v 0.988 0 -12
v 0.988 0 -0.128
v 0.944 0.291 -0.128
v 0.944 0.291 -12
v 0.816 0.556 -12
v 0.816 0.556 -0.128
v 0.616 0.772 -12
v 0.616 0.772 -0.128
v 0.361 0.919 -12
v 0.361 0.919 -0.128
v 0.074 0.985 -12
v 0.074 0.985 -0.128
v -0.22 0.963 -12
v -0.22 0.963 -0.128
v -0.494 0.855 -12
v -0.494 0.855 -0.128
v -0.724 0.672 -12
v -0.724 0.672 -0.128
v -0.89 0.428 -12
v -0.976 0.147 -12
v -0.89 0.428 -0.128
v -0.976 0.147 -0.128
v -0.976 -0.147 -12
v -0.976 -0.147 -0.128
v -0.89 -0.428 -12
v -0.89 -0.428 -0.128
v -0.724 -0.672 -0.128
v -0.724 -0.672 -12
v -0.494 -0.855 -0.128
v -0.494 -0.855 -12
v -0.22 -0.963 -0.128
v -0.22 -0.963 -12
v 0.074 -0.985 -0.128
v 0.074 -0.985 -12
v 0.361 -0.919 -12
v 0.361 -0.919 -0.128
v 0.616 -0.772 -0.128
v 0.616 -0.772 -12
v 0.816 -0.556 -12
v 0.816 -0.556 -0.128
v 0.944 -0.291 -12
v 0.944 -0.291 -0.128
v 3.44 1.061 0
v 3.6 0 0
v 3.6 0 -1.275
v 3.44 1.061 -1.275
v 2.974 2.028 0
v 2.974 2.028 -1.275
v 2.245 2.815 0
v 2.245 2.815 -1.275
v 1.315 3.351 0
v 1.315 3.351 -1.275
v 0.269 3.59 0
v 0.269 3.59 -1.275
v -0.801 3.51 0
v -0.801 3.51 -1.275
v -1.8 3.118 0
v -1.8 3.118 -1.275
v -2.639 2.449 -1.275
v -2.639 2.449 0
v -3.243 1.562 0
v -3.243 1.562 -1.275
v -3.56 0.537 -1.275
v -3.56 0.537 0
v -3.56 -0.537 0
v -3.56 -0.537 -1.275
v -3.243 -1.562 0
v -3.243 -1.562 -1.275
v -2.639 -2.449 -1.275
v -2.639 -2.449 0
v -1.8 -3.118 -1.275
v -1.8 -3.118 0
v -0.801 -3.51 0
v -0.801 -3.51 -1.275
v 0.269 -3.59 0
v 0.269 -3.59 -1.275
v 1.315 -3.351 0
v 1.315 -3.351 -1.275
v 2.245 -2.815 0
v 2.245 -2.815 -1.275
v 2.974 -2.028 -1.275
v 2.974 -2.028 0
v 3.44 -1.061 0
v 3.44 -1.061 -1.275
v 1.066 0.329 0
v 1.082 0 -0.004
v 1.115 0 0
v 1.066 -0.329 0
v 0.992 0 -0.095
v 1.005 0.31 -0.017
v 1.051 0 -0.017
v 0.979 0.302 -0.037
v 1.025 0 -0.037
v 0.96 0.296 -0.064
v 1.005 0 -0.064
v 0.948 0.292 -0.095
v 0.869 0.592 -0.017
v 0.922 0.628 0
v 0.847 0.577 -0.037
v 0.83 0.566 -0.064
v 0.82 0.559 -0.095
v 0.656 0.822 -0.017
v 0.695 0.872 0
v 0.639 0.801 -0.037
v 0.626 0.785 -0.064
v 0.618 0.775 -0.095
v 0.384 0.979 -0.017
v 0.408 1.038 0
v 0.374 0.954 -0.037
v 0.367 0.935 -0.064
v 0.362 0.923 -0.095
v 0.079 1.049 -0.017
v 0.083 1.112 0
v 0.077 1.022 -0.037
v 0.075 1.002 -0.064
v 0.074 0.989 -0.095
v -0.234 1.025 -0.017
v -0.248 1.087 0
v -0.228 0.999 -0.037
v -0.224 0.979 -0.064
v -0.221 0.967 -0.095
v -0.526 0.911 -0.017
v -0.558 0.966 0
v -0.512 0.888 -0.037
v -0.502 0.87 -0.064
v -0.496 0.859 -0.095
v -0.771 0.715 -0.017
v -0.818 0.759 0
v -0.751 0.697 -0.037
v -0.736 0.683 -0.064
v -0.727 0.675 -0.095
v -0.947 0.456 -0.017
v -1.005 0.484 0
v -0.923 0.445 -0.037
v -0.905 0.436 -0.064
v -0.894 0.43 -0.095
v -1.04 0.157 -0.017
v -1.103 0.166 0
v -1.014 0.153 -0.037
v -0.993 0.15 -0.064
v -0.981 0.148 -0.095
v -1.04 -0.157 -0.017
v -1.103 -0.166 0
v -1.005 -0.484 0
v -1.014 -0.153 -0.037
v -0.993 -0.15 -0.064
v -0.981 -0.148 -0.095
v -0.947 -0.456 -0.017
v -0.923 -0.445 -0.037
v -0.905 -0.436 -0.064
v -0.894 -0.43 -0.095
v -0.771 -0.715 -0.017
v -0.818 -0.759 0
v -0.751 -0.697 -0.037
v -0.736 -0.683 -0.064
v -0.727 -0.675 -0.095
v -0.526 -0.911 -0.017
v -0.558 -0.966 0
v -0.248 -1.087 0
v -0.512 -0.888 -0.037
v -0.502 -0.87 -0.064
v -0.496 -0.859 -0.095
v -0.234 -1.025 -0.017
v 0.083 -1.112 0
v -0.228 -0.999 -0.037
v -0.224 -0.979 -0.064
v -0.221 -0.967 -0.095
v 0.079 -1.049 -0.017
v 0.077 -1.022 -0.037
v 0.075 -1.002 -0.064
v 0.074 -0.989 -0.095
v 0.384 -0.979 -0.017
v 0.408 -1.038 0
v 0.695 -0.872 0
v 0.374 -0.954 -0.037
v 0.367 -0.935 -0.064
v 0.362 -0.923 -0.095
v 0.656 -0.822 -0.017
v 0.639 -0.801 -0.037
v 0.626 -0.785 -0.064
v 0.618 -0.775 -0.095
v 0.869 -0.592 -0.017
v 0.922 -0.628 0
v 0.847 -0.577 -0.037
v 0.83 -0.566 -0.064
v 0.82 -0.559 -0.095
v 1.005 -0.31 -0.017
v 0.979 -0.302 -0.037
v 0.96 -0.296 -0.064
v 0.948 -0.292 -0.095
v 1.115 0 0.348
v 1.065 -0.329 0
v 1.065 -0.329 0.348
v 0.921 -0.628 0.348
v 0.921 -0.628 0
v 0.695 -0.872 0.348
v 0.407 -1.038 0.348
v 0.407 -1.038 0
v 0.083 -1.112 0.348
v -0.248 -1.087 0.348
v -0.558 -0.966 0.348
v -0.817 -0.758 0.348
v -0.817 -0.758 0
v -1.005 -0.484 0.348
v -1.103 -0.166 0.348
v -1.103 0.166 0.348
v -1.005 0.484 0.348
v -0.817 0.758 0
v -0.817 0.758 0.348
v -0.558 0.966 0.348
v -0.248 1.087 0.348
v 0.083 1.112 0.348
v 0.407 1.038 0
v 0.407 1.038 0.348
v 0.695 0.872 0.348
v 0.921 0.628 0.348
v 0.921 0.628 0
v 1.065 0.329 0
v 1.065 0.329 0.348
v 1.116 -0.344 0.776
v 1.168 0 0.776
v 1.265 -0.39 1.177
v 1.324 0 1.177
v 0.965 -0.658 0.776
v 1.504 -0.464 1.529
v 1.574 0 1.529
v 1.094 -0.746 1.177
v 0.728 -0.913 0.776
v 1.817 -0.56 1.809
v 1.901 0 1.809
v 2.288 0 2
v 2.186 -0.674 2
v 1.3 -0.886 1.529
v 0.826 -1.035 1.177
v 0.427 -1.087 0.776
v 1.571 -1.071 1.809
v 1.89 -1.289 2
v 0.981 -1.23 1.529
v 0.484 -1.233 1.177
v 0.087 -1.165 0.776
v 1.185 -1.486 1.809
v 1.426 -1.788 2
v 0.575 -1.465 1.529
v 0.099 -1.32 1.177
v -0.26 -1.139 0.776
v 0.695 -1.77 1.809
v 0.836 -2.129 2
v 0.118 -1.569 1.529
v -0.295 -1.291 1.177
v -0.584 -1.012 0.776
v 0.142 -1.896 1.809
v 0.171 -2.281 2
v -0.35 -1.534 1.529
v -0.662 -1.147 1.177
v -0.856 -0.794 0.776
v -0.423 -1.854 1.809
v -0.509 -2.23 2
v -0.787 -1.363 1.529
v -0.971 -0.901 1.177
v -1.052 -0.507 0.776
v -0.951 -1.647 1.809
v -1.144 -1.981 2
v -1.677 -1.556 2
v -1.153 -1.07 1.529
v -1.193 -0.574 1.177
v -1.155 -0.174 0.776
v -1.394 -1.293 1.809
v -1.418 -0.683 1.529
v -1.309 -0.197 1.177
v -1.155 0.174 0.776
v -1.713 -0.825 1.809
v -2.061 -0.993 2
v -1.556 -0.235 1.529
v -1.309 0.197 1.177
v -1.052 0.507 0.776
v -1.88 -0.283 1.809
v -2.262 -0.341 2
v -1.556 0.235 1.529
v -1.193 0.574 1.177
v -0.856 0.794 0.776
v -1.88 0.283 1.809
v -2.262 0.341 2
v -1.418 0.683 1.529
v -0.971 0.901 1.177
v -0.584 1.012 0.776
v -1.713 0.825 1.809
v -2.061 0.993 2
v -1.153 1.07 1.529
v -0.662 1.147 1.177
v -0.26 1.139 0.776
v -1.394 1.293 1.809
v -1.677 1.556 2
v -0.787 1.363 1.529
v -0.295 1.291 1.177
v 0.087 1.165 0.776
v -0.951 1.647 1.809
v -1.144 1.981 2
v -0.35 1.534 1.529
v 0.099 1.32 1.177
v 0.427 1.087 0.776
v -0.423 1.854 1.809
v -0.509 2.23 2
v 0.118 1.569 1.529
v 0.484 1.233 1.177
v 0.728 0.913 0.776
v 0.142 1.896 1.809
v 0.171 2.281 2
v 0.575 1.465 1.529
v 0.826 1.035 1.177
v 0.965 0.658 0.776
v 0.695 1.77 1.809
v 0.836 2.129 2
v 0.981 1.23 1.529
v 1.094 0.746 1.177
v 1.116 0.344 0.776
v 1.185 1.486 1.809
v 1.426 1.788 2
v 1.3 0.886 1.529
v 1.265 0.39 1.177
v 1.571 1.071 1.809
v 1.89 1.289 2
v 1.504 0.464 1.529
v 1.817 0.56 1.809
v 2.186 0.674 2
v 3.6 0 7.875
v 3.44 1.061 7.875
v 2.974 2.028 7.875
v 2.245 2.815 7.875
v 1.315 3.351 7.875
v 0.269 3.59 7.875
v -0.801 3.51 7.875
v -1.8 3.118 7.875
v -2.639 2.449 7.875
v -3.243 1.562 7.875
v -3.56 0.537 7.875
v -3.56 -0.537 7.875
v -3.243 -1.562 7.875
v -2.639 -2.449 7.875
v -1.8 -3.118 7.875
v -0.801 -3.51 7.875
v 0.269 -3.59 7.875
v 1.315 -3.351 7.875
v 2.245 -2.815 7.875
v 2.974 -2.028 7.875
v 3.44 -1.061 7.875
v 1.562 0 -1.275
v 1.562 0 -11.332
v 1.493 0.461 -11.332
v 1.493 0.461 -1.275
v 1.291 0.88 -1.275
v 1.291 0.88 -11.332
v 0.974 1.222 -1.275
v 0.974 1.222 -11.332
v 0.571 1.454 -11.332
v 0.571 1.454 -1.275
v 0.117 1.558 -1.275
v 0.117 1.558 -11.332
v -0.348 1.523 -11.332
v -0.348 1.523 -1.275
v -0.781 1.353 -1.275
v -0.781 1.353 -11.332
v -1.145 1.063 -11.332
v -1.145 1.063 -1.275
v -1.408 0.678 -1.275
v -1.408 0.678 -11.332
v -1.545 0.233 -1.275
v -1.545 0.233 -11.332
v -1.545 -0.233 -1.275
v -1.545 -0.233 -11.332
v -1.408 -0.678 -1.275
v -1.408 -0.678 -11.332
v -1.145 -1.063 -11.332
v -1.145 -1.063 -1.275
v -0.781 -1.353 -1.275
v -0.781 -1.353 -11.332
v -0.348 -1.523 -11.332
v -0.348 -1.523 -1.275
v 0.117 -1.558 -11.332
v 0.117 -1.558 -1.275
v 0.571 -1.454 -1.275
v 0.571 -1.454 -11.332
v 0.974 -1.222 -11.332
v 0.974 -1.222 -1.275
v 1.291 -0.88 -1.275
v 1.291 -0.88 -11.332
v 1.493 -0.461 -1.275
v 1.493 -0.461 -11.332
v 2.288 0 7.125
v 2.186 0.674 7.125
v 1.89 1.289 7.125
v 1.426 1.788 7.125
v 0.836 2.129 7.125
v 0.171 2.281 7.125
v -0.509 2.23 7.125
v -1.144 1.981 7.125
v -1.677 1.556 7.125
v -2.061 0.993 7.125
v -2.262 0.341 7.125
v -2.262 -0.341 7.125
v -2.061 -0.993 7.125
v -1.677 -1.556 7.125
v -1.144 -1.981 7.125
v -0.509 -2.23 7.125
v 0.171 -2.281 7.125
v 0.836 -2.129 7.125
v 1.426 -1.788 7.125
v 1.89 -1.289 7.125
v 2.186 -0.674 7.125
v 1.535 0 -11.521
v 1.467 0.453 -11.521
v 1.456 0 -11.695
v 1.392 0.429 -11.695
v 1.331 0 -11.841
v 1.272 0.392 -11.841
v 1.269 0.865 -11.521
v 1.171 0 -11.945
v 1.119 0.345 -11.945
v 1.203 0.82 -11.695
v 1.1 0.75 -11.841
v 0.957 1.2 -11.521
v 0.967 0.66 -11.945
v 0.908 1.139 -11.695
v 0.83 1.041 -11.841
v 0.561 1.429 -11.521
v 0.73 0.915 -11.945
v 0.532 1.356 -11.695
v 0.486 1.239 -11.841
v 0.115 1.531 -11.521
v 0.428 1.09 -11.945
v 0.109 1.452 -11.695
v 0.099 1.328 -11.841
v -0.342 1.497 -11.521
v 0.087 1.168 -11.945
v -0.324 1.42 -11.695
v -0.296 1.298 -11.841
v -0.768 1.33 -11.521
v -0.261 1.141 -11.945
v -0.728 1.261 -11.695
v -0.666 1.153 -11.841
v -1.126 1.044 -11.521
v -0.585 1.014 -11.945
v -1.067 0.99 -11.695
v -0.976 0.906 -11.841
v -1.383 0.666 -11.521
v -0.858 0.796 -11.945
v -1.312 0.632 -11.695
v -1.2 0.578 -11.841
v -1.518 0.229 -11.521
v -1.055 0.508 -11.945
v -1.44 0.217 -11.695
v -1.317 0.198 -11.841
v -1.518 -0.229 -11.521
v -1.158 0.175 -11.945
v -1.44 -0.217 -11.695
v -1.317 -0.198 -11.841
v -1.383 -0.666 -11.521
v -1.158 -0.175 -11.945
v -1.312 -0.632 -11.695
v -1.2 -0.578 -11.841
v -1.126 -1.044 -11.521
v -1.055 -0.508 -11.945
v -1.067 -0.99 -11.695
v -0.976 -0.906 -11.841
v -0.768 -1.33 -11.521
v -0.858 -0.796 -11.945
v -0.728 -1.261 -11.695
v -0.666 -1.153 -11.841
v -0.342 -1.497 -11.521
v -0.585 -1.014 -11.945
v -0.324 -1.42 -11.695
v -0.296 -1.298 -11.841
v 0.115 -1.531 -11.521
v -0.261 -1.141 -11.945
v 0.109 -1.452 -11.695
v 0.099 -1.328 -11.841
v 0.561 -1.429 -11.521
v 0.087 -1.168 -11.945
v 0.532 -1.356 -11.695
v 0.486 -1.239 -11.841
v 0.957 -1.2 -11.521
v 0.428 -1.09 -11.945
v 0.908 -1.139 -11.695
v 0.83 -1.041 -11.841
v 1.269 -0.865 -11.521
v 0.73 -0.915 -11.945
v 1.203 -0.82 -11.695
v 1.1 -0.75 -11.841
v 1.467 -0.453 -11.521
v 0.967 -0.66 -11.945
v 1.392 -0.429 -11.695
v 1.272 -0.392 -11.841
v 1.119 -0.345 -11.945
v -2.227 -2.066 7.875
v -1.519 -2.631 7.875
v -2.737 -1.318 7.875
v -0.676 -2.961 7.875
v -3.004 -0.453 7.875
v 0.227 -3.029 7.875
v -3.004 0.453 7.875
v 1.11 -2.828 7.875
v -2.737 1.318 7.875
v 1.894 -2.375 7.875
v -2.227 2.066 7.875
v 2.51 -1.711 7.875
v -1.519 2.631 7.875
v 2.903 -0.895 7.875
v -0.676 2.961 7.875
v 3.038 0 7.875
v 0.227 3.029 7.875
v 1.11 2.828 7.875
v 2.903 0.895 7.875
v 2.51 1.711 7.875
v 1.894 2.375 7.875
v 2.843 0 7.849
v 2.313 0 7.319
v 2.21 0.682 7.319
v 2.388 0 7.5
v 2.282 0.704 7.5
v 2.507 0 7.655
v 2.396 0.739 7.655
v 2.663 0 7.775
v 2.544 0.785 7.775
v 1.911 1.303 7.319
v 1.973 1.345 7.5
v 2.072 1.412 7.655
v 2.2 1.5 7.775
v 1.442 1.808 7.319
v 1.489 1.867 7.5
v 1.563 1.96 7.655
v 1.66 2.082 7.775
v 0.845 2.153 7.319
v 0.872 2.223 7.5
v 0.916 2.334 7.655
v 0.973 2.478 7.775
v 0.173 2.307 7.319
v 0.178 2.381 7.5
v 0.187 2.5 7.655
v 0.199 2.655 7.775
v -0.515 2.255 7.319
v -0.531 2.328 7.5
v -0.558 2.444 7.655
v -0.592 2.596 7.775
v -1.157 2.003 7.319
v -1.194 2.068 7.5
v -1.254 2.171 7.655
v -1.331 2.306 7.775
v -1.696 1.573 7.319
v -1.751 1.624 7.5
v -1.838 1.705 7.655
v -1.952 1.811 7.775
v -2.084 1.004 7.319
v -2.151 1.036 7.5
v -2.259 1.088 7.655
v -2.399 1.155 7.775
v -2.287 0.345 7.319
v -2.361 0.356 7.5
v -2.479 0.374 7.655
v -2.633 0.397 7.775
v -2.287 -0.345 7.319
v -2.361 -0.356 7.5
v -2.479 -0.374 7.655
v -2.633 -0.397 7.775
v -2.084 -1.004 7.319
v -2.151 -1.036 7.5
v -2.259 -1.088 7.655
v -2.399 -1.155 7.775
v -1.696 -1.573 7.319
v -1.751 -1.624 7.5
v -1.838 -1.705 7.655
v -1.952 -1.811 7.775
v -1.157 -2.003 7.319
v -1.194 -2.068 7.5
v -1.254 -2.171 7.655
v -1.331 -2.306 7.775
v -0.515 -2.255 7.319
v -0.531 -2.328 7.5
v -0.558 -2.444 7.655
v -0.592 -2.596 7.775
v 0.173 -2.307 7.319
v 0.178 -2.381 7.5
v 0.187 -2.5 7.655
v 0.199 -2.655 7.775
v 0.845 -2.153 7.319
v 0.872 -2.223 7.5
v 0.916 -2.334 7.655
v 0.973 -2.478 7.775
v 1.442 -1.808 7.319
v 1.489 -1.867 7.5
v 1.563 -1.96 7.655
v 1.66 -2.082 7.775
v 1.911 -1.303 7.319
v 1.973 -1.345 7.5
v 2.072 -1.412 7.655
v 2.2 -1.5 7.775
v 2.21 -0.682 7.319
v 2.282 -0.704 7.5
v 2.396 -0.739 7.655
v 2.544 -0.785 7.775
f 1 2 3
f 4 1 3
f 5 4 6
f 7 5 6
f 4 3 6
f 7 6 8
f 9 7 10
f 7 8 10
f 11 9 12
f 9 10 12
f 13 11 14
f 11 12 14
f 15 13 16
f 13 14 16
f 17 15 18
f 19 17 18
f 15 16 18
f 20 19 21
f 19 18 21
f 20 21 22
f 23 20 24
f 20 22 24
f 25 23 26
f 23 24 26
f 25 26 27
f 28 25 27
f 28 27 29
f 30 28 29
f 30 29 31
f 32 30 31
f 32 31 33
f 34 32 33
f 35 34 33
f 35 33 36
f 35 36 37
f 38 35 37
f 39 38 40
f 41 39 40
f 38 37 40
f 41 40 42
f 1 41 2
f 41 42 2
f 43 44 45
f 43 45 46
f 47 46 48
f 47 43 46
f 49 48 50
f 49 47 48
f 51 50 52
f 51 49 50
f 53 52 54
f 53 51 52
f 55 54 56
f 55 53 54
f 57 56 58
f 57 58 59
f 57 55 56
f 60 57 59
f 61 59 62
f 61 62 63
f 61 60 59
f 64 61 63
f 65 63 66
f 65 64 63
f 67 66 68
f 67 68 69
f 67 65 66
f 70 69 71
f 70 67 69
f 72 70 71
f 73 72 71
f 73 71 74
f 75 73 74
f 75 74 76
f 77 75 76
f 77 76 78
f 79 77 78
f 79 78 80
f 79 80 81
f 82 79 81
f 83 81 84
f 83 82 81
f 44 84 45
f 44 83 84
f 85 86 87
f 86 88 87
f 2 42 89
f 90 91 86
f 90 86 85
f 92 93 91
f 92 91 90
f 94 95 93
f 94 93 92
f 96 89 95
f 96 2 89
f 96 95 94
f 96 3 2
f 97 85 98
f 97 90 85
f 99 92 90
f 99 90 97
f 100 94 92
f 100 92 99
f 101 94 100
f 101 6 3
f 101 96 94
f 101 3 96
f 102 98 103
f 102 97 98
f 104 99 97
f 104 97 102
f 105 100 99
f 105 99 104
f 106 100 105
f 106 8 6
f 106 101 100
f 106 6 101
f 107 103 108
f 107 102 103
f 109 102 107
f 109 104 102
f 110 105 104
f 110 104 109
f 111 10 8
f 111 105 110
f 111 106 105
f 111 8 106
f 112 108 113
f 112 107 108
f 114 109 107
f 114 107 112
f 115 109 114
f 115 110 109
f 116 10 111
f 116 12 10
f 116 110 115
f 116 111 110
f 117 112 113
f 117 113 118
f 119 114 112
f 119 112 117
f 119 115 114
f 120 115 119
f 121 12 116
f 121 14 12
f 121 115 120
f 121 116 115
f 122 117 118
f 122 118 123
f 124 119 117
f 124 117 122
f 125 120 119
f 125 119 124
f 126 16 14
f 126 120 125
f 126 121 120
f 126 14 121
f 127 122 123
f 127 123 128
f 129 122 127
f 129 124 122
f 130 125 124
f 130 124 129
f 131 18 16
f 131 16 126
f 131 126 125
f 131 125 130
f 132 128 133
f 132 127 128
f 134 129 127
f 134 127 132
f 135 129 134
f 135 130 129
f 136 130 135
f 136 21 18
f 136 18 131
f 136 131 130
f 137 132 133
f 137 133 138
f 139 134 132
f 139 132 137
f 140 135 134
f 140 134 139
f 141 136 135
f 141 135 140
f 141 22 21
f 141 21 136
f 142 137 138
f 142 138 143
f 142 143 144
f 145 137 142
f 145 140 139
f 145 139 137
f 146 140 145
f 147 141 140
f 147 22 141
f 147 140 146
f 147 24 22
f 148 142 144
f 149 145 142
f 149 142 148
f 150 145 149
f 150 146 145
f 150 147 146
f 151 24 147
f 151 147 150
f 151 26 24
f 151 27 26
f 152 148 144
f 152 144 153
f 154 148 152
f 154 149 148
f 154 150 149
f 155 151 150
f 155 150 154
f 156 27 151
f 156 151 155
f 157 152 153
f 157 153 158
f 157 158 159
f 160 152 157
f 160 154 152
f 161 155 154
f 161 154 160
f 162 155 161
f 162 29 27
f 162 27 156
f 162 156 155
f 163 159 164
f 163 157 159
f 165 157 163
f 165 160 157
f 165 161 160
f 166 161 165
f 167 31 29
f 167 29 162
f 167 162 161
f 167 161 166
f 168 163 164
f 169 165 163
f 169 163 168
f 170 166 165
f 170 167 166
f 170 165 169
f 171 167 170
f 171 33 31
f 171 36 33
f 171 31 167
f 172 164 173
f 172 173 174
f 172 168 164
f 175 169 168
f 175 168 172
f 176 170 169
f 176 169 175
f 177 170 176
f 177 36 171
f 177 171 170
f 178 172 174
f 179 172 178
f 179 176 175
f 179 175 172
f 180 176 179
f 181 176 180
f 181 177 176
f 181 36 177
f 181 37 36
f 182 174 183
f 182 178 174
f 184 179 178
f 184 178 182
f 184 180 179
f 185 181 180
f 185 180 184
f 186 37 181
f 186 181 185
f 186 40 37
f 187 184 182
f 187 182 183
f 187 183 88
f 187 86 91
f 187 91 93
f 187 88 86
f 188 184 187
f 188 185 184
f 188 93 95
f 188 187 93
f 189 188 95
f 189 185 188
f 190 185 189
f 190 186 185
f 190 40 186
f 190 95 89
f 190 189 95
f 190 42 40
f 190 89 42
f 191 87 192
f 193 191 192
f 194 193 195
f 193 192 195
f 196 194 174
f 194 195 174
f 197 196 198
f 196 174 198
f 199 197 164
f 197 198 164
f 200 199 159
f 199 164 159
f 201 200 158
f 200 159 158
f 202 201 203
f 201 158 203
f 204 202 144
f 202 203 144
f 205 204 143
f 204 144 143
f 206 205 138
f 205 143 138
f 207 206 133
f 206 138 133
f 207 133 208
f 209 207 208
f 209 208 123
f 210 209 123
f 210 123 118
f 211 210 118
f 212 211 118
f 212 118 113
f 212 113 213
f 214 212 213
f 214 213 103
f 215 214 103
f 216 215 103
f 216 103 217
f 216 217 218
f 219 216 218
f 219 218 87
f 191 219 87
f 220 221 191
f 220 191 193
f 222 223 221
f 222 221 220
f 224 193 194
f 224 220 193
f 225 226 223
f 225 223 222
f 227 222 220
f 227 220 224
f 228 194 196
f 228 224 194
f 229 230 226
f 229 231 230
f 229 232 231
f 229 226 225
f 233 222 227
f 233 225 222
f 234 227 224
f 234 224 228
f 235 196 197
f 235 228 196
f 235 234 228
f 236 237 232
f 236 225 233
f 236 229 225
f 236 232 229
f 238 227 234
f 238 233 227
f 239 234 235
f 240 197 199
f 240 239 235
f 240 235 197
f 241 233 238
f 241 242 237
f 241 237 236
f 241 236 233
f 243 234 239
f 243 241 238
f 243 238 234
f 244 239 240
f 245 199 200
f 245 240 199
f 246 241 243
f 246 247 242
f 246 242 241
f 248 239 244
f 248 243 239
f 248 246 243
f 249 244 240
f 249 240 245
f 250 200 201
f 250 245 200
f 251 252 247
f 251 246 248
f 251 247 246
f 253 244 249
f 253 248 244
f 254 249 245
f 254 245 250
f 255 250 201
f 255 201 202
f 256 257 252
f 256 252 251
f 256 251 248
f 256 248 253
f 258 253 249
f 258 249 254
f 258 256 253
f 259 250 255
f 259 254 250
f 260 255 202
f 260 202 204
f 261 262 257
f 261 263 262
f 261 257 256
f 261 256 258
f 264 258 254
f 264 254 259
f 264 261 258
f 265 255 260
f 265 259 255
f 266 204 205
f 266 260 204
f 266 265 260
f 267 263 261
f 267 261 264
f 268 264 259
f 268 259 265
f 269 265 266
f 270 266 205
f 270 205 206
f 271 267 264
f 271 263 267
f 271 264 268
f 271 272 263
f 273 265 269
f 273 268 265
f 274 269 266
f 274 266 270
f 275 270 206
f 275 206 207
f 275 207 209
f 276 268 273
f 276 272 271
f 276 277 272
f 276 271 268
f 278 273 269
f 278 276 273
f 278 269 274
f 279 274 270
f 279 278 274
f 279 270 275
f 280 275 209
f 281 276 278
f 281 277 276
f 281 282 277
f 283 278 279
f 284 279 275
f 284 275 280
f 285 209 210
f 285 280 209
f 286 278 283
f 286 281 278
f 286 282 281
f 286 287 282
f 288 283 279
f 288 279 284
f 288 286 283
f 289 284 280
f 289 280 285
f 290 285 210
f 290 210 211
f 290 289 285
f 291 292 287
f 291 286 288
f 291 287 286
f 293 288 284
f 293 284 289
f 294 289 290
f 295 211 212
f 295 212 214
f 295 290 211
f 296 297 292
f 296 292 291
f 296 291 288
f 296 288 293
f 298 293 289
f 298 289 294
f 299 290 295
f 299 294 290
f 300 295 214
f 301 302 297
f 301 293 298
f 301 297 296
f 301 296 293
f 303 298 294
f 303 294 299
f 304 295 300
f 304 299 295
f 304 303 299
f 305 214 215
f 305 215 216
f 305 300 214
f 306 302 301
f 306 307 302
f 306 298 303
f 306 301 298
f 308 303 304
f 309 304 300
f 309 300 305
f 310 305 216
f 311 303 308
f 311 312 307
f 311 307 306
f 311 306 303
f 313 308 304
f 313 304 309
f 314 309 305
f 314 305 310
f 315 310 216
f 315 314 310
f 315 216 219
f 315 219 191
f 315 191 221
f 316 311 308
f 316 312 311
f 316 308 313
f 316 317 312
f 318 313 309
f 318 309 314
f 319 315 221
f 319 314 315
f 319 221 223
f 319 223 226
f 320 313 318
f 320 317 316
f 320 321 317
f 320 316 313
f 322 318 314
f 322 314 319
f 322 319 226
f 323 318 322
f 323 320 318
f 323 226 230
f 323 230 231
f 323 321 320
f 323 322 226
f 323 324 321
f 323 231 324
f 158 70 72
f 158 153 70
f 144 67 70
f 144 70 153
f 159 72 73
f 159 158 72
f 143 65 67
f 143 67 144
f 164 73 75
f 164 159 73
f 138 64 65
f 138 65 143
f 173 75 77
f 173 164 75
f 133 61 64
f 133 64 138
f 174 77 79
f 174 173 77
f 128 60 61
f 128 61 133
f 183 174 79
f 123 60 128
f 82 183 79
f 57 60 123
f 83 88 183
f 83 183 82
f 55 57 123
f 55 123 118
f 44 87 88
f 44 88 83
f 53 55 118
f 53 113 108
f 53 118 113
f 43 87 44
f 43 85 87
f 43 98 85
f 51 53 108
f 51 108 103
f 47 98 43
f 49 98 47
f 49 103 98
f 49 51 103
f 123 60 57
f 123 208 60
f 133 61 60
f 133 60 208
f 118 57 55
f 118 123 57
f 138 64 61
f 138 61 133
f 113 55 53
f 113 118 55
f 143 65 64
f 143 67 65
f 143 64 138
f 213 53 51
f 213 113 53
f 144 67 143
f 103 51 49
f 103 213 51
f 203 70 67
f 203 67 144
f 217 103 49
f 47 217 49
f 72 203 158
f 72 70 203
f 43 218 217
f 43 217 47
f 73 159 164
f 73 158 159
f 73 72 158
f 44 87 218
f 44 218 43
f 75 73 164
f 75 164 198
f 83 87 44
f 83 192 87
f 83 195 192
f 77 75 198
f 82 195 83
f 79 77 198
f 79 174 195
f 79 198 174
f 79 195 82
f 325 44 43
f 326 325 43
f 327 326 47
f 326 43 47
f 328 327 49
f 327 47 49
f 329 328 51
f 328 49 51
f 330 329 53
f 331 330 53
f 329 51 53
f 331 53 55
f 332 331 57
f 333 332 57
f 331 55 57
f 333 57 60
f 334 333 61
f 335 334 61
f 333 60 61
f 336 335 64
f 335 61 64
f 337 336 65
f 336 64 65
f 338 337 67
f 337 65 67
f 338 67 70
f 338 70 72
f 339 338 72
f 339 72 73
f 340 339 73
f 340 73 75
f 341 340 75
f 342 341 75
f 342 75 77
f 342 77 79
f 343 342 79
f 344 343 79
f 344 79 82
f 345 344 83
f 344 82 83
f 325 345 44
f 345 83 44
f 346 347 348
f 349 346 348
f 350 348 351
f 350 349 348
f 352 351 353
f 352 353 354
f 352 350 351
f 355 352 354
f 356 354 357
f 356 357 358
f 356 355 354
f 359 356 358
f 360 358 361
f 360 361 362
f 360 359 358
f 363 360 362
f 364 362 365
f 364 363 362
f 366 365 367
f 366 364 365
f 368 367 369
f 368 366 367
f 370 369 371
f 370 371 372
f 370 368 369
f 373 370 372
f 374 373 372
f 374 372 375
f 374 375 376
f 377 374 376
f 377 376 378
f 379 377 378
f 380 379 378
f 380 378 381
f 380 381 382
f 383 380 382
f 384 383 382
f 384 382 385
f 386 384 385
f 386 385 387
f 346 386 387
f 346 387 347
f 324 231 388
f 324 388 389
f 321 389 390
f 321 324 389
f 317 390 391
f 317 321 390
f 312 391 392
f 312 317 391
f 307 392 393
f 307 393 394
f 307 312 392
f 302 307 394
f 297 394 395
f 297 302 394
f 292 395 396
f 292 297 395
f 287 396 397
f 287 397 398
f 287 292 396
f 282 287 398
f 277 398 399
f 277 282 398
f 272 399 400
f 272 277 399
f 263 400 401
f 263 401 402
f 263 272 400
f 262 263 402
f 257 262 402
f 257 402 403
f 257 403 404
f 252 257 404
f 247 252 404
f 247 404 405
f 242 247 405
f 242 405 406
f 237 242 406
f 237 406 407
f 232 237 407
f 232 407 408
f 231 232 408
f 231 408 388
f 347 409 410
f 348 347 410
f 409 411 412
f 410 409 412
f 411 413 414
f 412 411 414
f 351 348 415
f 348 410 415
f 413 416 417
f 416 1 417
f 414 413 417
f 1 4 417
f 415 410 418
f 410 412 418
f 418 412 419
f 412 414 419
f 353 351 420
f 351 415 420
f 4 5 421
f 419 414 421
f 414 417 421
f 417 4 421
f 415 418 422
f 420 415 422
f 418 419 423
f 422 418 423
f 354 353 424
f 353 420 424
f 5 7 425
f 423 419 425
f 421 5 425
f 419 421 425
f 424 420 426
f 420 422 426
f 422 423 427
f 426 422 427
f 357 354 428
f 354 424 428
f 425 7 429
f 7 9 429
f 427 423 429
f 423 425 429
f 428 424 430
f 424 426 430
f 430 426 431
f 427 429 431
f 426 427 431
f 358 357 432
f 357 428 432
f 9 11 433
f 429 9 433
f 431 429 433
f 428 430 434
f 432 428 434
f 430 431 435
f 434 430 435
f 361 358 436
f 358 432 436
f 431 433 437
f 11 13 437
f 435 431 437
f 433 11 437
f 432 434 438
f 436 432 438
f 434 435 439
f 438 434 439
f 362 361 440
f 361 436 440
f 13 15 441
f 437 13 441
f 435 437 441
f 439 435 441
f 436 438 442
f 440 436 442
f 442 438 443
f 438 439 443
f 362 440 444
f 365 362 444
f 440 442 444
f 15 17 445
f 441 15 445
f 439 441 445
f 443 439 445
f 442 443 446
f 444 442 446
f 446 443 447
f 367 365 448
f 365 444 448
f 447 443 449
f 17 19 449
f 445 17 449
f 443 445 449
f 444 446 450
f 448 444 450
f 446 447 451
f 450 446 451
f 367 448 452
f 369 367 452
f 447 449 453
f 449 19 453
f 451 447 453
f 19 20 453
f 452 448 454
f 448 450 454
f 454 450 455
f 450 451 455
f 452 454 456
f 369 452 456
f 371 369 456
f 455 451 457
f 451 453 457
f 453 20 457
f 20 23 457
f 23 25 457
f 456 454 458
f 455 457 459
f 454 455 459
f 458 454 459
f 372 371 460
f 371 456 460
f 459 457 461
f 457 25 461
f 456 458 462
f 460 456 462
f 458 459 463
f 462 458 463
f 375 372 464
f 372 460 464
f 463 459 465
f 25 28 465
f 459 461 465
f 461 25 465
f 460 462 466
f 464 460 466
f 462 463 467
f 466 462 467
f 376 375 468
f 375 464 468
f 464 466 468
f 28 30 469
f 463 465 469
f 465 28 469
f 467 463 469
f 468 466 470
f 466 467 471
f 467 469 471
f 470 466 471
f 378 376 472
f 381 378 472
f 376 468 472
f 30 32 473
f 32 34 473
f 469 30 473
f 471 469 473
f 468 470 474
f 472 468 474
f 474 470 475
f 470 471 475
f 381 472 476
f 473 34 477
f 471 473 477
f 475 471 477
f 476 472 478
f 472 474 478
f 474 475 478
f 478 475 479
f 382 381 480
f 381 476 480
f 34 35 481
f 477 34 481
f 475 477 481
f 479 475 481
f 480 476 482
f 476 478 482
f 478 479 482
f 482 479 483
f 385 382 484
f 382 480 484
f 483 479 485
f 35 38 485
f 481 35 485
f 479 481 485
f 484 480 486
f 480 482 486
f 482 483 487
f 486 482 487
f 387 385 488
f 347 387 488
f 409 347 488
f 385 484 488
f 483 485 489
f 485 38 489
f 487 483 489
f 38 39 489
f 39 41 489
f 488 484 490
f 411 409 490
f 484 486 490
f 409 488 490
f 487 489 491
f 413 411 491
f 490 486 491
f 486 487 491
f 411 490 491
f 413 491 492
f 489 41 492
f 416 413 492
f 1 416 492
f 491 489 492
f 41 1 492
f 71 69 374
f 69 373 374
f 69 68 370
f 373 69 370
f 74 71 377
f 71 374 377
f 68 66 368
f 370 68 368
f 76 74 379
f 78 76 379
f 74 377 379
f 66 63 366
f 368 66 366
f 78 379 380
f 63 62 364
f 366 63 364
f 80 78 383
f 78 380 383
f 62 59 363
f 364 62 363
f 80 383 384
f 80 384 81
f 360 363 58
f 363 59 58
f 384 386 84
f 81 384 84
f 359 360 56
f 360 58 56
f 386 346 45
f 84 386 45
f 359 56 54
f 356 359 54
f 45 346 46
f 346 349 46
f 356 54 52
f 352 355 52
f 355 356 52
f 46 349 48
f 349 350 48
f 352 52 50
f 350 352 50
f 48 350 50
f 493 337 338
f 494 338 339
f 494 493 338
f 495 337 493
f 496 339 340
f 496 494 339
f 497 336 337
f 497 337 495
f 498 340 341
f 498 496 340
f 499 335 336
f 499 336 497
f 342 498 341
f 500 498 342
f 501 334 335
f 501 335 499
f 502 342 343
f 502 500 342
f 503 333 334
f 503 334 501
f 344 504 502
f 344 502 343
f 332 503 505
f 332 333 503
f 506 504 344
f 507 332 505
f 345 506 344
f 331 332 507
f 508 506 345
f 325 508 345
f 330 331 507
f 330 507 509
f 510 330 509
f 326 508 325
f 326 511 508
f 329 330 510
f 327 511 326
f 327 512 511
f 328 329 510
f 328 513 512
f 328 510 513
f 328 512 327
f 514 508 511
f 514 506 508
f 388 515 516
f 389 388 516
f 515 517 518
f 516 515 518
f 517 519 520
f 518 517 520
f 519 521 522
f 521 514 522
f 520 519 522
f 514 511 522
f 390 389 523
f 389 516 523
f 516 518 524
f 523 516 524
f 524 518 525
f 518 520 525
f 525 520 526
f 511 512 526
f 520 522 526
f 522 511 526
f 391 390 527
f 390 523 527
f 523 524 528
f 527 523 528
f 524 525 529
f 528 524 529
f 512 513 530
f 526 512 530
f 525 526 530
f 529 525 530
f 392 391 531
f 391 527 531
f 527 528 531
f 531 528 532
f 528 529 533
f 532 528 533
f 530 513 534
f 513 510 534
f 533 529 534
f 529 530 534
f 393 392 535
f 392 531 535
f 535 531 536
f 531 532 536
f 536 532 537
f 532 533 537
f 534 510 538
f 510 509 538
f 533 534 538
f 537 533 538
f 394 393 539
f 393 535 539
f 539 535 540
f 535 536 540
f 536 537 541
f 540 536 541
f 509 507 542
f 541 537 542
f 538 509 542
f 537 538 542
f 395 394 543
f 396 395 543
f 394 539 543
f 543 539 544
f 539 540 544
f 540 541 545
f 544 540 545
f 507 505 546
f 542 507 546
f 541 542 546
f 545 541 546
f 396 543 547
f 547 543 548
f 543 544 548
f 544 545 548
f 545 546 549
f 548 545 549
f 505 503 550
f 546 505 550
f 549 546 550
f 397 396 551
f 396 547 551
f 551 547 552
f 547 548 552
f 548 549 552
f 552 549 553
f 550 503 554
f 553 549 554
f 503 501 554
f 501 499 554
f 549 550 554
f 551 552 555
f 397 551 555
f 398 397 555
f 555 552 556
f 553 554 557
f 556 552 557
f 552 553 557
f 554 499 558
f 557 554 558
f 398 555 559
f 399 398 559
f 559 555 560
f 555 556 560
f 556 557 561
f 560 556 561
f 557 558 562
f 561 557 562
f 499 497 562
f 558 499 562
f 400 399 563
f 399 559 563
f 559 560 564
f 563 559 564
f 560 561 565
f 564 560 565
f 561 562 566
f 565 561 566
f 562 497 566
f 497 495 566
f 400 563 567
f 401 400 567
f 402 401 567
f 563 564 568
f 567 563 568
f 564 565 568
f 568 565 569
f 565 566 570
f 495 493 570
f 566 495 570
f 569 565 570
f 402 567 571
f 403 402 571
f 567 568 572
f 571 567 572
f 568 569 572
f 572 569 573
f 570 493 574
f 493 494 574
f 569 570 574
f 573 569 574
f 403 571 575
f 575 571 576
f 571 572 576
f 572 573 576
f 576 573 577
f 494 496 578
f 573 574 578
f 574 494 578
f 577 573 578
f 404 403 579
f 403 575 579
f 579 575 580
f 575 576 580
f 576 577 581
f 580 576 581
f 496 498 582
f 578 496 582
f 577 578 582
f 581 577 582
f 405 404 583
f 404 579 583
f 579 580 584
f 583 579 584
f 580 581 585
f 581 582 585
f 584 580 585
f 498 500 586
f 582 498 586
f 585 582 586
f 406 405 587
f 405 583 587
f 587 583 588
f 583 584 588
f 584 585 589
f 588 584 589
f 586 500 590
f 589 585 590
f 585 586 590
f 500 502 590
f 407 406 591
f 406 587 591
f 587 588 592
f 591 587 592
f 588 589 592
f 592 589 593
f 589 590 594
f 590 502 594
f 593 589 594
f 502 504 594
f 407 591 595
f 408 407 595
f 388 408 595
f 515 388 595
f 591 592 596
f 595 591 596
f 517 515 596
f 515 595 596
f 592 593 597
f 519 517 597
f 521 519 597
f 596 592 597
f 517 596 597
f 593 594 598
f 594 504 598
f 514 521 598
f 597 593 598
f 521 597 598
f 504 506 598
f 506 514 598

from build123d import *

# Parameters (mm, degrees)
F0_R     = 1.5625
F0_R_2   = 0.9875
F1_DEPTH = 12
F2_R     = 3.6
F2_R_2   = 2.5
F2_R_3   = 1.5625
F3_DEPTH = 1.275
F4_R     = 3.6
F4_R_2   = 2.2875
F5_DEPTH = 7.875
F6_R     = 2.2875
F6_R_2   = 1.115
F7_DEPTH = 2
F9_R     = 0.75
F11_R    = 0.1279533188


# Not quite as in the source:
# - a fillet or chamfer that OpenCascade refuses, or shapes differently, is made with other operations: its cross-section is extruded or revolved along the edge and cut away or added


with BuildPart() as f1:
    # F0 (on Top) → F1 (new body)
    with BuildSketch(Plane.XY):
        Circle(F0_R)
        Circle(F0_R_2, mode=Mode.SUBTRACT)
    extrude(amount=-F1_DEPTH)

    # F2 (on face) → F3 (join)
    with BuildSketch(Plane.XY):
        Circle(F2_R)
        Circle(F2_R_2, mode=Mode.SUBTRACT)
        Circle(F2_R_2)
        Circle(F2_R_3, mode=Mode.SUBTRACT)
    extrude(amount=-F3_DEPTH)

    # F10: fillet of radius 0.6759797975 on 1 edges, made by hand

    # F10_s1 → F10_t2 (revolve, cut)
    with BuildSketch(Plane.XZ):
        with BuildLine():
            ThreePointArc((1.5625, -11.3316050815), (1.3989697072, -11.7724499428), (0.9875, -12))
            Line((0.9875, -12), (1.5625, -12))
            Line((1.5625, -12), (1.5625, -11.3316050815))
        make_face()
    revolve(axis=Axis((0, 0, -12), (0, 0, 1)), mode=Mode.SUBTRACT)

    # F11
    f11_edges = [f1.edges().sort_by_distance(p)[0] for p in [
        (-0.9875, 0, 0),
    ]]
    fillet(f11_edges, radius=F11_R)


with BuildPart() as f5:
    # F4 (on face) → F5 (new body)
    with BuildSketch(Plane.XY):
        Circle(F4_R)
        Circle(F4_R_2, mode=Mode.SUBTRACT)
    extrude(amount=F5_DEPTH)

    # F6 (on face) → F7 (join)
    with BuildSketch(Plane(origin=(0, 0, 0), x_dir=(1, 0, 0), z_dir=(0, 0, -1))):
        Circle(F6_R)
        Circle(F6_R_2, mode=Mode.SUBTRACT)
    extrude(amount=-F7_DEPTH)

    # F8: fillet of radius 1.75 on 1 edges, made by hand

    # F8_s1 → F8_t2 (revolve, cut)
    with BuildSketch(Plane.XZ):
        with BuildLine():
            ThreePointArc((1.115, 0.348033369), (1.4379181873, 1.360919098), (2.2875, 2))
            Line((2.2875, 2), (1.115, 2))
            Line((1.115, 2), (1.115, 0.348033369))
        make_face()
    revolve(axis=Axis((0, 0, 2), (0, 0, -1)), mode=Mode.SUBTRACT)

    # F9
    f9_edges = [f5.edges().sort_by_distance(p)[0] for p in [
        (-2.2875, 0, 7.875),
    ]]
    fillet(f9_edges, radius=F9_R)


solid = Compound([f1.part, f5.part])
